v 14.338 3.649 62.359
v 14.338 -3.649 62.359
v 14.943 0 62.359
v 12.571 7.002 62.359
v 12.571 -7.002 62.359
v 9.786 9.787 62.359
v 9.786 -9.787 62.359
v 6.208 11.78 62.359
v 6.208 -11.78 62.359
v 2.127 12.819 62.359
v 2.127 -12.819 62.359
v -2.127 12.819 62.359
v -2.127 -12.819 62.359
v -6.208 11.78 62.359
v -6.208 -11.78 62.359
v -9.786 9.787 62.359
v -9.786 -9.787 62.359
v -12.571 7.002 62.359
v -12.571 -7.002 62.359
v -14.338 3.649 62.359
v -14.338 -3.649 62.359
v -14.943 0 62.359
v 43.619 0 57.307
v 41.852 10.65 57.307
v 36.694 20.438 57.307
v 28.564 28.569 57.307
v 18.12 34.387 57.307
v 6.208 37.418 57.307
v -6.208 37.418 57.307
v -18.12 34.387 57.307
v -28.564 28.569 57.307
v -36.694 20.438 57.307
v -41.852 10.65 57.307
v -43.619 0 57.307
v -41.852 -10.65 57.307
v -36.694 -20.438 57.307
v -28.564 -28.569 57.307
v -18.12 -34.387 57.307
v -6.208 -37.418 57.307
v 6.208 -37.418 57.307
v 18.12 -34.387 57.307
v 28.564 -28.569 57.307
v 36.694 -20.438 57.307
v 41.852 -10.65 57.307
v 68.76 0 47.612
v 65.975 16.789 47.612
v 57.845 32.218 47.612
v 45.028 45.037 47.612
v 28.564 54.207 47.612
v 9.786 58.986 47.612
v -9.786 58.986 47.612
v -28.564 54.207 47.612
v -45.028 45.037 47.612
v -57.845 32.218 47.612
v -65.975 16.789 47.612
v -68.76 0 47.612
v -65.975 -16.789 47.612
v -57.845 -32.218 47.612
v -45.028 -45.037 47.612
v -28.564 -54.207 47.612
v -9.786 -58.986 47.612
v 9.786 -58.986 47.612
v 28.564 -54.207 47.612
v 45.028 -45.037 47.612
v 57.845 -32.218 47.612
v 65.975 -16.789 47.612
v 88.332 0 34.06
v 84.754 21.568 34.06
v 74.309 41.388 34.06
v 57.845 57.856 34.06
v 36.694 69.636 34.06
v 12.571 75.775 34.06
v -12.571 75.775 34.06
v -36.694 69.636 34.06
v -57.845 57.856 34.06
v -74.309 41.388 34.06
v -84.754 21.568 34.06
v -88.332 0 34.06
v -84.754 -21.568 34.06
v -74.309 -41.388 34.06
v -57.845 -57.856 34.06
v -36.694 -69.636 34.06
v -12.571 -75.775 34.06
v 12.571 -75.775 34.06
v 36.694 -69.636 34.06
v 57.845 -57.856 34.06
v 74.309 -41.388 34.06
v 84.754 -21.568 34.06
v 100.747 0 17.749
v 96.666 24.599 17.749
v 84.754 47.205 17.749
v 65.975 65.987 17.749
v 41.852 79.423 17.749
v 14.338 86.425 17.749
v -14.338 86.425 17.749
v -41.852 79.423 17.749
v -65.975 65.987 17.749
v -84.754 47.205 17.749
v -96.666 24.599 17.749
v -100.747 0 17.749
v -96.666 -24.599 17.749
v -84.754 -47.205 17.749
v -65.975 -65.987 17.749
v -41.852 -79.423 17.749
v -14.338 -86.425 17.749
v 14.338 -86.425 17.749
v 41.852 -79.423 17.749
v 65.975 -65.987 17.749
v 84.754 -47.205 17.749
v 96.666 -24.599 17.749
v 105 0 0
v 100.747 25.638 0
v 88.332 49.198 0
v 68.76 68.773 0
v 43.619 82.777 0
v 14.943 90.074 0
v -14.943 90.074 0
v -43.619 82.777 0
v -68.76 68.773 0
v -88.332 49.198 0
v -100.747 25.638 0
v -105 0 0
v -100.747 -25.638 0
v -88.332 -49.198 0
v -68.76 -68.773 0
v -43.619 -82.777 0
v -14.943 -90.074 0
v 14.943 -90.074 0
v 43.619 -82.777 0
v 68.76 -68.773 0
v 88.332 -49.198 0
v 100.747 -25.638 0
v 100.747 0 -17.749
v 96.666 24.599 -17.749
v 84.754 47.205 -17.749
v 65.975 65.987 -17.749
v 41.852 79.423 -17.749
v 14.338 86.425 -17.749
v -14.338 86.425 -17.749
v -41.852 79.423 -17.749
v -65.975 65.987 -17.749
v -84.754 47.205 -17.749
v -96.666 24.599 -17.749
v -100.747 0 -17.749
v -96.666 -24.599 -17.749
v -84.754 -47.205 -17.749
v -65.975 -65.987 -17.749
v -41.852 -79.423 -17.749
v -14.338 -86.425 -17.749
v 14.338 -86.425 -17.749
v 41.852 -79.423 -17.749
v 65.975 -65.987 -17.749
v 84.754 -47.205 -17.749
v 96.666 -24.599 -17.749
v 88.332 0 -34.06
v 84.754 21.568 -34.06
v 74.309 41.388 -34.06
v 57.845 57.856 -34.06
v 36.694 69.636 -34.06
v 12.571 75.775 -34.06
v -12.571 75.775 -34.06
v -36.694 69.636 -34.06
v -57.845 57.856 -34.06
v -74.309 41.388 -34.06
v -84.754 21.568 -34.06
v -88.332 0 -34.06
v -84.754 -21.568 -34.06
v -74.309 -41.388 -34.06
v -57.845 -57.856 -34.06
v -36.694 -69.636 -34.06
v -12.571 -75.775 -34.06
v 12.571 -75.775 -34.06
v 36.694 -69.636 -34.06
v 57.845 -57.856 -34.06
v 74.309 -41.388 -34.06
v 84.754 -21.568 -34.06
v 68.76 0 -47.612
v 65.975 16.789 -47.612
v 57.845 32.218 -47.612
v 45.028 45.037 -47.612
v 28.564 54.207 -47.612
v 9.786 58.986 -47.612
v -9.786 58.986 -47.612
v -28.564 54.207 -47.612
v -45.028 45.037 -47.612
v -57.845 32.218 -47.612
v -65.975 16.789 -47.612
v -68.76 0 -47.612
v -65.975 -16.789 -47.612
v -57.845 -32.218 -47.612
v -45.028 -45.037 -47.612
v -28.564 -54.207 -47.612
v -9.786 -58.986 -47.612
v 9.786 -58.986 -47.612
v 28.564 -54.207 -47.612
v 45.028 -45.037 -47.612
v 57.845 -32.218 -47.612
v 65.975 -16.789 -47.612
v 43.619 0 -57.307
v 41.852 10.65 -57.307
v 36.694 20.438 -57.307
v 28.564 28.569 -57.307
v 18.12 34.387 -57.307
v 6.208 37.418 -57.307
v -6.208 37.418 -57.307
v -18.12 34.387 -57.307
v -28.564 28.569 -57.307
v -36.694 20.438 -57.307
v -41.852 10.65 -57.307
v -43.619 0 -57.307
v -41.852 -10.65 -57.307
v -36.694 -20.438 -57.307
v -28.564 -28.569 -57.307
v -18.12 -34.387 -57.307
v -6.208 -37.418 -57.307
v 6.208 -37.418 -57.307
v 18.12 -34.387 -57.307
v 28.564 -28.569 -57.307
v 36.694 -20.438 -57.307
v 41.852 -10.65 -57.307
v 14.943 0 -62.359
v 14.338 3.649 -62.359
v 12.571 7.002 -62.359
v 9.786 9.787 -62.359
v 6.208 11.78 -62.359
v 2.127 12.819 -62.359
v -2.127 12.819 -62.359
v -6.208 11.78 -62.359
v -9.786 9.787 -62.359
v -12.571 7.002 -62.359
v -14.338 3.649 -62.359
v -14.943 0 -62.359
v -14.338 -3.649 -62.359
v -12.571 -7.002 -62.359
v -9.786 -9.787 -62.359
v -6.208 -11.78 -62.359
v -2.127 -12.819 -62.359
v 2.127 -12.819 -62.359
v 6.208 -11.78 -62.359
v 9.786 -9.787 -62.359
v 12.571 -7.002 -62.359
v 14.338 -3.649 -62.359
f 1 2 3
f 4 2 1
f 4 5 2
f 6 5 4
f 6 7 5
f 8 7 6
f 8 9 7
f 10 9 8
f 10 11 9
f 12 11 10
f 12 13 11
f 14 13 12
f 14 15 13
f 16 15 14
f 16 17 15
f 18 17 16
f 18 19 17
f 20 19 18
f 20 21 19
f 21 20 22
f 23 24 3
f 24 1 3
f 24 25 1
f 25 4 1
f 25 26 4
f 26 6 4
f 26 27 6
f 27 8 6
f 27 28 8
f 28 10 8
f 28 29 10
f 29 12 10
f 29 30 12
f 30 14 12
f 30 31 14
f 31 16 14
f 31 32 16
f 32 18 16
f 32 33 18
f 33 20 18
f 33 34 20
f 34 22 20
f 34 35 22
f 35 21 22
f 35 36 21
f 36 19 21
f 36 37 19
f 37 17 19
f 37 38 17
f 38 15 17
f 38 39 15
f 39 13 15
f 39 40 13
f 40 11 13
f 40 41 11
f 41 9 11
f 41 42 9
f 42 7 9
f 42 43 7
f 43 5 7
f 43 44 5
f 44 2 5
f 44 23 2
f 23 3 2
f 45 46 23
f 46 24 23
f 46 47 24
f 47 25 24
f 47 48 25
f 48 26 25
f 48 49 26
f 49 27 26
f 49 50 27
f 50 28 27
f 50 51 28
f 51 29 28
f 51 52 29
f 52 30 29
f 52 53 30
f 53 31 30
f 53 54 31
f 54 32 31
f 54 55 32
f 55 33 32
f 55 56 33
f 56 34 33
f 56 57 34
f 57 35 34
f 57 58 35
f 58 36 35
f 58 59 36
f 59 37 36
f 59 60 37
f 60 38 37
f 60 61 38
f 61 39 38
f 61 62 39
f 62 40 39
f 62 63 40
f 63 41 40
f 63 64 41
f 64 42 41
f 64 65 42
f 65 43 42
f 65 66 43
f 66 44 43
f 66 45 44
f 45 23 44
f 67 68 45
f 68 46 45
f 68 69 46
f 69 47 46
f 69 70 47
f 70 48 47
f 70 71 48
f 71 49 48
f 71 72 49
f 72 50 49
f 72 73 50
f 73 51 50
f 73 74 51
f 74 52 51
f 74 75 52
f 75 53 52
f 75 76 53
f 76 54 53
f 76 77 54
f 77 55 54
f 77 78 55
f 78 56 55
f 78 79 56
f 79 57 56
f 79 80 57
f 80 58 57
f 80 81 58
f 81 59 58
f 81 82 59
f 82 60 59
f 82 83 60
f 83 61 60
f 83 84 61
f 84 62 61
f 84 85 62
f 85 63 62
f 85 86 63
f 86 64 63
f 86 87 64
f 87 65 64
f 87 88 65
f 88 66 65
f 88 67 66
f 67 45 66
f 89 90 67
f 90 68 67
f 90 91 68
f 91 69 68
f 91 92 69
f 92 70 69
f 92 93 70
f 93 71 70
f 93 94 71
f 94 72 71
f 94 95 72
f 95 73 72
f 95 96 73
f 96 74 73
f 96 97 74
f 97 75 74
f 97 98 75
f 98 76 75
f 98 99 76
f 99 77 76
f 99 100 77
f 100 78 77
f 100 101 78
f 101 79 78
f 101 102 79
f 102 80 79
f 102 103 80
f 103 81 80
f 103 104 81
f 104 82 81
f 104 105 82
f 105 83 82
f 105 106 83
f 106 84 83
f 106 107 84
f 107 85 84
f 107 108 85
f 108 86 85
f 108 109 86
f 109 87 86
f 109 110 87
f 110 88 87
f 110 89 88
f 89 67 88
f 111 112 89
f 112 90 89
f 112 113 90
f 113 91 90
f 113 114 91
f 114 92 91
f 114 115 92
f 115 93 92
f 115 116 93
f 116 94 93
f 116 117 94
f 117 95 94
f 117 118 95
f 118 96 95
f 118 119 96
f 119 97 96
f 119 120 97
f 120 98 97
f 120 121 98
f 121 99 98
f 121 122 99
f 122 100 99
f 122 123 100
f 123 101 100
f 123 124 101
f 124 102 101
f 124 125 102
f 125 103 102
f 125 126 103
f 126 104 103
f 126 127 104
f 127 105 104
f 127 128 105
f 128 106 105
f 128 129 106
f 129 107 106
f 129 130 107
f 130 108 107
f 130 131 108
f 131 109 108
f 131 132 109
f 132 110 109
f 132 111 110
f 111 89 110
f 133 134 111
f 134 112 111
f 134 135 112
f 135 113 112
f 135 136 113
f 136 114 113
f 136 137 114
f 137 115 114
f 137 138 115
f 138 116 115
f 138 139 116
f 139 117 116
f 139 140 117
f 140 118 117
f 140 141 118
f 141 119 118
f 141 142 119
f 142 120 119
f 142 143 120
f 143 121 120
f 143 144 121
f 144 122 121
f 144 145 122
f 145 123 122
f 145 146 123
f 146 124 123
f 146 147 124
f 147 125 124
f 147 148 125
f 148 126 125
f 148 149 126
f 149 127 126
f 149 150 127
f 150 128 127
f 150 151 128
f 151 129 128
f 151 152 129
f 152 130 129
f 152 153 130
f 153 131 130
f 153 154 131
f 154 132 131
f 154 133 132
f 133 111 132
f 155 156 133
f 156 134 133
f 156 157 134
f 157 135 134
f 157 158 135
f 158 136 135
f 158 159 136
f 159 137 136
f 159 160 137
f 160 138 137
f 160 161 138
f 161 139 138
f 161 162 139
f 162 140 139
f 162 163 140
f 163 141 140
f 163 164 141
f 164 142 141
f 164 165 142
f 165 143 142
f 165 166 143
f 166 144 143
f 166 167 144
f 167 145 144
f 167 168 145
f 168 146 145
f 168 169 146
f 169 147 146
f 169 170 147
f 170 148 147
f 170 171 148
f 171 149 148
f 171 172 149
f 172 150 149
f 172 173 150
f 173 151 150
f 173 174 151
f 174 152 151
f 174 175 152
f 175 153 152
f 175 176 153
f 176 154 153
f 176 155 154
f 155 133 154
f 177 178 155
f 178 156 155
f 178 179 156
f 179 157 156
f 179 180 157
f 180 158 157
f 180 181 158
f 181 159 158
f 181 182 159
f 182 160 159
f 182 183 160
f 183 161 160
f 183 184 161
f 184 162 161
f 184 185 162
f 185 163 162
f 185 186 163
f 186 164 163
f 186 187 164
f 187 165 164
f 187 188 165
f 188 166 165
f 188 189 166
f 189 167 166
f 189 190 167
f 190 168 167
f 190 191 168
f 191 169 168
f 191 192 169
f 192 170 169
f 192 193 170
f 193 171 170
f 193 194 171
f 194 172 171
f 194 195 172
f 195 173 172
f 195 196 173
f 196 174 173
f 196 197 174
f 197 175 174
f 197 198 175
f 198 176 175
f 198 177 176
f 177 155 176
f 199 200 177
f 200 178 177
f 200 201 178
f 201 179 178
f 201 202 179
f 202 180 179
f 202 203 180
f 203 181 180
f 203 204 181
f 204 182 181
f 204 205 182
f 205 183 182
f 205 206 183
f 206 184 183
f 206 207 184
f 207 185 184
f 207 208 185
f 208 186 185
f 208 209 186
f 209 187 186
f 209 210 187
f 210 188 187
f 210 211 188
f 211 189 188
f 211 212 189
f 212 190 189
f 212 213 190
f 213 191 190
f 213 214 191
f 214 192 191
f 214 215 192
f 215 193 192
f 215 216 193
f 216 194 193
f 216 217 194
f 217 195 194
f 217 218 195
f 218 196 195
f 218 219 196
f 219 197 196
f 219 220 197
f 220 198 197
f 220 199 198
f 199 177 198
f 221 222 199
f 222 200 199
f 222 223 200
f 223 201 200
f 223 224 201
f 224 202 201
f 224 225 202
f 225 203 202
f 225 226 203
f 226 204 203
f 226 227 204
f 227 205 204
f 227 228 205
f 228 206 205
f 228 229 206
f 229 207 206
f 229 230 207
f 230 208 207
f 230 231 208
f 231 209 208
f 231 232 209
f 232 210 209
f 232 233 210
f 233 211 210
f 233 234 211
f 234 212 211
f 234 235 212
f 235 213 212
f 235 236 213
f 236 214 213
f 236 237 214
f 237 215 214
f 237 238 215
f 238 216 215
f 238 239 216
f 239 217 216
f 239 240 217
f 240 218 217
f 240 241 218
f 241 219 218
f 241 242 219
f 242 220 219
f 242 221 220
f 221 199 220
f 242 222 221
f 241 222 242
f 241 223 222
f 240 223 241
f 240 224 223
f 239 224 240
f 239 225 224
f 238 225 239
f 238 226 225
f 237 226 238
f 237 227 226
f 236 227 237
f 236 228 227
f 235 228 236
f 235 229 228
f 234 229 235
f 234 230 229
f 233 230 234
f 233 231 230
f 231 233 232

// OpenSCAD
// Generated by SolidPython 1.0.1 on 2020-07-29 00:46:52


scale(v = [15, 13, 9]) {
	sphere(r = 7);
}
/***********************************************
*********      SolidPython code:      **********
************************************************
 
# import packages: SolidPython
from solid import *
from solid.utils import *
from itertools import chain, combinations, permutations


class Resize:

    def __init__(self, scad_file):
        self.scad_file = scad_file
        #self.scad_file = import_scad(scad_file)
        # cone/cylinder param:
        self.r1 = 0
        self.r2 = 0
        self.h = 0
        # rectangular prism param:
        self.w = 0
        self.l = 0
        # ellipse param:
        self.r = 0

    # import OpenScad code (file name corresponds to shape)


    # classify shape + parameters
    def assign(self, param1, param2, param3):
        if self.scad_file == 'cone.scad':
            self.r1 = param1
            self.r2 = param2
            self.h = param3
        elif self.scad_file == 'cylinder.scad':
            self.r1 = param1
            self.r2 = param2
            self.h = param3
        elif self.scad_file == 'rectangularPrism.scad':
            self.h = param1
            self.l = param2
            self.w = param3
        else:
            self.r = param1
            self.h = param2

    # resize parameters
    def iterate(self):
        x = range(3, 20, 2)
        i = 1
        if self.scad_file == 'cone.scad':
            tempList = list(permutations(x, 2))
            for temp in tempList:
                param1 = temp[0]
                param2 = temp[1]
                filepath = 'produced_scad_files/' + 'cone' + str(param1) + '_' + str(param2) + '_' + '.scad'
                scad_render_to_file(cylinder(h=param1, r1=param2, r2=0), filepath)

        elif self.scad_file == 'cylinder.scad':
            tempList = list(permutations(x, 3))
            for temp in tempList:
                param1 = temp[0]
                param2 = temp[1]
                filepath = 'produced_scad_files/' + 'cylinder' + str(param1) + '_' + str(param2) + '_' + '.scad'
                scad_render_to_file(cylinder(h=param1, r1=param2, r2=param2), filepath)

        elif self.scad_file == 'rectangularPrism.scad':
            tempList = list(permutations(x, 3))
            for temp in tempList:
                param1 = temp[0]
                param2 = temp[1]
                param3 = temp[2]
                filepath = 'produced_scad_files/' + 'rectangularPrism' + str(param1) + '_' + str(param2) + '_' + str(
                    param3) + '.scad'
                scad_render_to_file(cube(size=(param1, param2, param3)), filepath)

        elif self.scad_file == 'ellipse.scad':
            tempList = list(permutations(x, 4))
            for temp in tempList:
                param1 = temp[0]
                param2 = temp[1]
                param3 = temp[2]
                param4 = temp[3]
                filepath = 'produced_scad_files/' + 'ellipse' + str(param1) + '_' + str(param2) + '_' + str(param3) + '_' + str(param4) + '.scad'
                scad_render_to_file(scale([param1, param2, param3])(sphere(r=param4)), filepath)

    def render_to_scadfile(self):
        scad_render_to_file(scad, 'example.scad') 
 
************************************************/
